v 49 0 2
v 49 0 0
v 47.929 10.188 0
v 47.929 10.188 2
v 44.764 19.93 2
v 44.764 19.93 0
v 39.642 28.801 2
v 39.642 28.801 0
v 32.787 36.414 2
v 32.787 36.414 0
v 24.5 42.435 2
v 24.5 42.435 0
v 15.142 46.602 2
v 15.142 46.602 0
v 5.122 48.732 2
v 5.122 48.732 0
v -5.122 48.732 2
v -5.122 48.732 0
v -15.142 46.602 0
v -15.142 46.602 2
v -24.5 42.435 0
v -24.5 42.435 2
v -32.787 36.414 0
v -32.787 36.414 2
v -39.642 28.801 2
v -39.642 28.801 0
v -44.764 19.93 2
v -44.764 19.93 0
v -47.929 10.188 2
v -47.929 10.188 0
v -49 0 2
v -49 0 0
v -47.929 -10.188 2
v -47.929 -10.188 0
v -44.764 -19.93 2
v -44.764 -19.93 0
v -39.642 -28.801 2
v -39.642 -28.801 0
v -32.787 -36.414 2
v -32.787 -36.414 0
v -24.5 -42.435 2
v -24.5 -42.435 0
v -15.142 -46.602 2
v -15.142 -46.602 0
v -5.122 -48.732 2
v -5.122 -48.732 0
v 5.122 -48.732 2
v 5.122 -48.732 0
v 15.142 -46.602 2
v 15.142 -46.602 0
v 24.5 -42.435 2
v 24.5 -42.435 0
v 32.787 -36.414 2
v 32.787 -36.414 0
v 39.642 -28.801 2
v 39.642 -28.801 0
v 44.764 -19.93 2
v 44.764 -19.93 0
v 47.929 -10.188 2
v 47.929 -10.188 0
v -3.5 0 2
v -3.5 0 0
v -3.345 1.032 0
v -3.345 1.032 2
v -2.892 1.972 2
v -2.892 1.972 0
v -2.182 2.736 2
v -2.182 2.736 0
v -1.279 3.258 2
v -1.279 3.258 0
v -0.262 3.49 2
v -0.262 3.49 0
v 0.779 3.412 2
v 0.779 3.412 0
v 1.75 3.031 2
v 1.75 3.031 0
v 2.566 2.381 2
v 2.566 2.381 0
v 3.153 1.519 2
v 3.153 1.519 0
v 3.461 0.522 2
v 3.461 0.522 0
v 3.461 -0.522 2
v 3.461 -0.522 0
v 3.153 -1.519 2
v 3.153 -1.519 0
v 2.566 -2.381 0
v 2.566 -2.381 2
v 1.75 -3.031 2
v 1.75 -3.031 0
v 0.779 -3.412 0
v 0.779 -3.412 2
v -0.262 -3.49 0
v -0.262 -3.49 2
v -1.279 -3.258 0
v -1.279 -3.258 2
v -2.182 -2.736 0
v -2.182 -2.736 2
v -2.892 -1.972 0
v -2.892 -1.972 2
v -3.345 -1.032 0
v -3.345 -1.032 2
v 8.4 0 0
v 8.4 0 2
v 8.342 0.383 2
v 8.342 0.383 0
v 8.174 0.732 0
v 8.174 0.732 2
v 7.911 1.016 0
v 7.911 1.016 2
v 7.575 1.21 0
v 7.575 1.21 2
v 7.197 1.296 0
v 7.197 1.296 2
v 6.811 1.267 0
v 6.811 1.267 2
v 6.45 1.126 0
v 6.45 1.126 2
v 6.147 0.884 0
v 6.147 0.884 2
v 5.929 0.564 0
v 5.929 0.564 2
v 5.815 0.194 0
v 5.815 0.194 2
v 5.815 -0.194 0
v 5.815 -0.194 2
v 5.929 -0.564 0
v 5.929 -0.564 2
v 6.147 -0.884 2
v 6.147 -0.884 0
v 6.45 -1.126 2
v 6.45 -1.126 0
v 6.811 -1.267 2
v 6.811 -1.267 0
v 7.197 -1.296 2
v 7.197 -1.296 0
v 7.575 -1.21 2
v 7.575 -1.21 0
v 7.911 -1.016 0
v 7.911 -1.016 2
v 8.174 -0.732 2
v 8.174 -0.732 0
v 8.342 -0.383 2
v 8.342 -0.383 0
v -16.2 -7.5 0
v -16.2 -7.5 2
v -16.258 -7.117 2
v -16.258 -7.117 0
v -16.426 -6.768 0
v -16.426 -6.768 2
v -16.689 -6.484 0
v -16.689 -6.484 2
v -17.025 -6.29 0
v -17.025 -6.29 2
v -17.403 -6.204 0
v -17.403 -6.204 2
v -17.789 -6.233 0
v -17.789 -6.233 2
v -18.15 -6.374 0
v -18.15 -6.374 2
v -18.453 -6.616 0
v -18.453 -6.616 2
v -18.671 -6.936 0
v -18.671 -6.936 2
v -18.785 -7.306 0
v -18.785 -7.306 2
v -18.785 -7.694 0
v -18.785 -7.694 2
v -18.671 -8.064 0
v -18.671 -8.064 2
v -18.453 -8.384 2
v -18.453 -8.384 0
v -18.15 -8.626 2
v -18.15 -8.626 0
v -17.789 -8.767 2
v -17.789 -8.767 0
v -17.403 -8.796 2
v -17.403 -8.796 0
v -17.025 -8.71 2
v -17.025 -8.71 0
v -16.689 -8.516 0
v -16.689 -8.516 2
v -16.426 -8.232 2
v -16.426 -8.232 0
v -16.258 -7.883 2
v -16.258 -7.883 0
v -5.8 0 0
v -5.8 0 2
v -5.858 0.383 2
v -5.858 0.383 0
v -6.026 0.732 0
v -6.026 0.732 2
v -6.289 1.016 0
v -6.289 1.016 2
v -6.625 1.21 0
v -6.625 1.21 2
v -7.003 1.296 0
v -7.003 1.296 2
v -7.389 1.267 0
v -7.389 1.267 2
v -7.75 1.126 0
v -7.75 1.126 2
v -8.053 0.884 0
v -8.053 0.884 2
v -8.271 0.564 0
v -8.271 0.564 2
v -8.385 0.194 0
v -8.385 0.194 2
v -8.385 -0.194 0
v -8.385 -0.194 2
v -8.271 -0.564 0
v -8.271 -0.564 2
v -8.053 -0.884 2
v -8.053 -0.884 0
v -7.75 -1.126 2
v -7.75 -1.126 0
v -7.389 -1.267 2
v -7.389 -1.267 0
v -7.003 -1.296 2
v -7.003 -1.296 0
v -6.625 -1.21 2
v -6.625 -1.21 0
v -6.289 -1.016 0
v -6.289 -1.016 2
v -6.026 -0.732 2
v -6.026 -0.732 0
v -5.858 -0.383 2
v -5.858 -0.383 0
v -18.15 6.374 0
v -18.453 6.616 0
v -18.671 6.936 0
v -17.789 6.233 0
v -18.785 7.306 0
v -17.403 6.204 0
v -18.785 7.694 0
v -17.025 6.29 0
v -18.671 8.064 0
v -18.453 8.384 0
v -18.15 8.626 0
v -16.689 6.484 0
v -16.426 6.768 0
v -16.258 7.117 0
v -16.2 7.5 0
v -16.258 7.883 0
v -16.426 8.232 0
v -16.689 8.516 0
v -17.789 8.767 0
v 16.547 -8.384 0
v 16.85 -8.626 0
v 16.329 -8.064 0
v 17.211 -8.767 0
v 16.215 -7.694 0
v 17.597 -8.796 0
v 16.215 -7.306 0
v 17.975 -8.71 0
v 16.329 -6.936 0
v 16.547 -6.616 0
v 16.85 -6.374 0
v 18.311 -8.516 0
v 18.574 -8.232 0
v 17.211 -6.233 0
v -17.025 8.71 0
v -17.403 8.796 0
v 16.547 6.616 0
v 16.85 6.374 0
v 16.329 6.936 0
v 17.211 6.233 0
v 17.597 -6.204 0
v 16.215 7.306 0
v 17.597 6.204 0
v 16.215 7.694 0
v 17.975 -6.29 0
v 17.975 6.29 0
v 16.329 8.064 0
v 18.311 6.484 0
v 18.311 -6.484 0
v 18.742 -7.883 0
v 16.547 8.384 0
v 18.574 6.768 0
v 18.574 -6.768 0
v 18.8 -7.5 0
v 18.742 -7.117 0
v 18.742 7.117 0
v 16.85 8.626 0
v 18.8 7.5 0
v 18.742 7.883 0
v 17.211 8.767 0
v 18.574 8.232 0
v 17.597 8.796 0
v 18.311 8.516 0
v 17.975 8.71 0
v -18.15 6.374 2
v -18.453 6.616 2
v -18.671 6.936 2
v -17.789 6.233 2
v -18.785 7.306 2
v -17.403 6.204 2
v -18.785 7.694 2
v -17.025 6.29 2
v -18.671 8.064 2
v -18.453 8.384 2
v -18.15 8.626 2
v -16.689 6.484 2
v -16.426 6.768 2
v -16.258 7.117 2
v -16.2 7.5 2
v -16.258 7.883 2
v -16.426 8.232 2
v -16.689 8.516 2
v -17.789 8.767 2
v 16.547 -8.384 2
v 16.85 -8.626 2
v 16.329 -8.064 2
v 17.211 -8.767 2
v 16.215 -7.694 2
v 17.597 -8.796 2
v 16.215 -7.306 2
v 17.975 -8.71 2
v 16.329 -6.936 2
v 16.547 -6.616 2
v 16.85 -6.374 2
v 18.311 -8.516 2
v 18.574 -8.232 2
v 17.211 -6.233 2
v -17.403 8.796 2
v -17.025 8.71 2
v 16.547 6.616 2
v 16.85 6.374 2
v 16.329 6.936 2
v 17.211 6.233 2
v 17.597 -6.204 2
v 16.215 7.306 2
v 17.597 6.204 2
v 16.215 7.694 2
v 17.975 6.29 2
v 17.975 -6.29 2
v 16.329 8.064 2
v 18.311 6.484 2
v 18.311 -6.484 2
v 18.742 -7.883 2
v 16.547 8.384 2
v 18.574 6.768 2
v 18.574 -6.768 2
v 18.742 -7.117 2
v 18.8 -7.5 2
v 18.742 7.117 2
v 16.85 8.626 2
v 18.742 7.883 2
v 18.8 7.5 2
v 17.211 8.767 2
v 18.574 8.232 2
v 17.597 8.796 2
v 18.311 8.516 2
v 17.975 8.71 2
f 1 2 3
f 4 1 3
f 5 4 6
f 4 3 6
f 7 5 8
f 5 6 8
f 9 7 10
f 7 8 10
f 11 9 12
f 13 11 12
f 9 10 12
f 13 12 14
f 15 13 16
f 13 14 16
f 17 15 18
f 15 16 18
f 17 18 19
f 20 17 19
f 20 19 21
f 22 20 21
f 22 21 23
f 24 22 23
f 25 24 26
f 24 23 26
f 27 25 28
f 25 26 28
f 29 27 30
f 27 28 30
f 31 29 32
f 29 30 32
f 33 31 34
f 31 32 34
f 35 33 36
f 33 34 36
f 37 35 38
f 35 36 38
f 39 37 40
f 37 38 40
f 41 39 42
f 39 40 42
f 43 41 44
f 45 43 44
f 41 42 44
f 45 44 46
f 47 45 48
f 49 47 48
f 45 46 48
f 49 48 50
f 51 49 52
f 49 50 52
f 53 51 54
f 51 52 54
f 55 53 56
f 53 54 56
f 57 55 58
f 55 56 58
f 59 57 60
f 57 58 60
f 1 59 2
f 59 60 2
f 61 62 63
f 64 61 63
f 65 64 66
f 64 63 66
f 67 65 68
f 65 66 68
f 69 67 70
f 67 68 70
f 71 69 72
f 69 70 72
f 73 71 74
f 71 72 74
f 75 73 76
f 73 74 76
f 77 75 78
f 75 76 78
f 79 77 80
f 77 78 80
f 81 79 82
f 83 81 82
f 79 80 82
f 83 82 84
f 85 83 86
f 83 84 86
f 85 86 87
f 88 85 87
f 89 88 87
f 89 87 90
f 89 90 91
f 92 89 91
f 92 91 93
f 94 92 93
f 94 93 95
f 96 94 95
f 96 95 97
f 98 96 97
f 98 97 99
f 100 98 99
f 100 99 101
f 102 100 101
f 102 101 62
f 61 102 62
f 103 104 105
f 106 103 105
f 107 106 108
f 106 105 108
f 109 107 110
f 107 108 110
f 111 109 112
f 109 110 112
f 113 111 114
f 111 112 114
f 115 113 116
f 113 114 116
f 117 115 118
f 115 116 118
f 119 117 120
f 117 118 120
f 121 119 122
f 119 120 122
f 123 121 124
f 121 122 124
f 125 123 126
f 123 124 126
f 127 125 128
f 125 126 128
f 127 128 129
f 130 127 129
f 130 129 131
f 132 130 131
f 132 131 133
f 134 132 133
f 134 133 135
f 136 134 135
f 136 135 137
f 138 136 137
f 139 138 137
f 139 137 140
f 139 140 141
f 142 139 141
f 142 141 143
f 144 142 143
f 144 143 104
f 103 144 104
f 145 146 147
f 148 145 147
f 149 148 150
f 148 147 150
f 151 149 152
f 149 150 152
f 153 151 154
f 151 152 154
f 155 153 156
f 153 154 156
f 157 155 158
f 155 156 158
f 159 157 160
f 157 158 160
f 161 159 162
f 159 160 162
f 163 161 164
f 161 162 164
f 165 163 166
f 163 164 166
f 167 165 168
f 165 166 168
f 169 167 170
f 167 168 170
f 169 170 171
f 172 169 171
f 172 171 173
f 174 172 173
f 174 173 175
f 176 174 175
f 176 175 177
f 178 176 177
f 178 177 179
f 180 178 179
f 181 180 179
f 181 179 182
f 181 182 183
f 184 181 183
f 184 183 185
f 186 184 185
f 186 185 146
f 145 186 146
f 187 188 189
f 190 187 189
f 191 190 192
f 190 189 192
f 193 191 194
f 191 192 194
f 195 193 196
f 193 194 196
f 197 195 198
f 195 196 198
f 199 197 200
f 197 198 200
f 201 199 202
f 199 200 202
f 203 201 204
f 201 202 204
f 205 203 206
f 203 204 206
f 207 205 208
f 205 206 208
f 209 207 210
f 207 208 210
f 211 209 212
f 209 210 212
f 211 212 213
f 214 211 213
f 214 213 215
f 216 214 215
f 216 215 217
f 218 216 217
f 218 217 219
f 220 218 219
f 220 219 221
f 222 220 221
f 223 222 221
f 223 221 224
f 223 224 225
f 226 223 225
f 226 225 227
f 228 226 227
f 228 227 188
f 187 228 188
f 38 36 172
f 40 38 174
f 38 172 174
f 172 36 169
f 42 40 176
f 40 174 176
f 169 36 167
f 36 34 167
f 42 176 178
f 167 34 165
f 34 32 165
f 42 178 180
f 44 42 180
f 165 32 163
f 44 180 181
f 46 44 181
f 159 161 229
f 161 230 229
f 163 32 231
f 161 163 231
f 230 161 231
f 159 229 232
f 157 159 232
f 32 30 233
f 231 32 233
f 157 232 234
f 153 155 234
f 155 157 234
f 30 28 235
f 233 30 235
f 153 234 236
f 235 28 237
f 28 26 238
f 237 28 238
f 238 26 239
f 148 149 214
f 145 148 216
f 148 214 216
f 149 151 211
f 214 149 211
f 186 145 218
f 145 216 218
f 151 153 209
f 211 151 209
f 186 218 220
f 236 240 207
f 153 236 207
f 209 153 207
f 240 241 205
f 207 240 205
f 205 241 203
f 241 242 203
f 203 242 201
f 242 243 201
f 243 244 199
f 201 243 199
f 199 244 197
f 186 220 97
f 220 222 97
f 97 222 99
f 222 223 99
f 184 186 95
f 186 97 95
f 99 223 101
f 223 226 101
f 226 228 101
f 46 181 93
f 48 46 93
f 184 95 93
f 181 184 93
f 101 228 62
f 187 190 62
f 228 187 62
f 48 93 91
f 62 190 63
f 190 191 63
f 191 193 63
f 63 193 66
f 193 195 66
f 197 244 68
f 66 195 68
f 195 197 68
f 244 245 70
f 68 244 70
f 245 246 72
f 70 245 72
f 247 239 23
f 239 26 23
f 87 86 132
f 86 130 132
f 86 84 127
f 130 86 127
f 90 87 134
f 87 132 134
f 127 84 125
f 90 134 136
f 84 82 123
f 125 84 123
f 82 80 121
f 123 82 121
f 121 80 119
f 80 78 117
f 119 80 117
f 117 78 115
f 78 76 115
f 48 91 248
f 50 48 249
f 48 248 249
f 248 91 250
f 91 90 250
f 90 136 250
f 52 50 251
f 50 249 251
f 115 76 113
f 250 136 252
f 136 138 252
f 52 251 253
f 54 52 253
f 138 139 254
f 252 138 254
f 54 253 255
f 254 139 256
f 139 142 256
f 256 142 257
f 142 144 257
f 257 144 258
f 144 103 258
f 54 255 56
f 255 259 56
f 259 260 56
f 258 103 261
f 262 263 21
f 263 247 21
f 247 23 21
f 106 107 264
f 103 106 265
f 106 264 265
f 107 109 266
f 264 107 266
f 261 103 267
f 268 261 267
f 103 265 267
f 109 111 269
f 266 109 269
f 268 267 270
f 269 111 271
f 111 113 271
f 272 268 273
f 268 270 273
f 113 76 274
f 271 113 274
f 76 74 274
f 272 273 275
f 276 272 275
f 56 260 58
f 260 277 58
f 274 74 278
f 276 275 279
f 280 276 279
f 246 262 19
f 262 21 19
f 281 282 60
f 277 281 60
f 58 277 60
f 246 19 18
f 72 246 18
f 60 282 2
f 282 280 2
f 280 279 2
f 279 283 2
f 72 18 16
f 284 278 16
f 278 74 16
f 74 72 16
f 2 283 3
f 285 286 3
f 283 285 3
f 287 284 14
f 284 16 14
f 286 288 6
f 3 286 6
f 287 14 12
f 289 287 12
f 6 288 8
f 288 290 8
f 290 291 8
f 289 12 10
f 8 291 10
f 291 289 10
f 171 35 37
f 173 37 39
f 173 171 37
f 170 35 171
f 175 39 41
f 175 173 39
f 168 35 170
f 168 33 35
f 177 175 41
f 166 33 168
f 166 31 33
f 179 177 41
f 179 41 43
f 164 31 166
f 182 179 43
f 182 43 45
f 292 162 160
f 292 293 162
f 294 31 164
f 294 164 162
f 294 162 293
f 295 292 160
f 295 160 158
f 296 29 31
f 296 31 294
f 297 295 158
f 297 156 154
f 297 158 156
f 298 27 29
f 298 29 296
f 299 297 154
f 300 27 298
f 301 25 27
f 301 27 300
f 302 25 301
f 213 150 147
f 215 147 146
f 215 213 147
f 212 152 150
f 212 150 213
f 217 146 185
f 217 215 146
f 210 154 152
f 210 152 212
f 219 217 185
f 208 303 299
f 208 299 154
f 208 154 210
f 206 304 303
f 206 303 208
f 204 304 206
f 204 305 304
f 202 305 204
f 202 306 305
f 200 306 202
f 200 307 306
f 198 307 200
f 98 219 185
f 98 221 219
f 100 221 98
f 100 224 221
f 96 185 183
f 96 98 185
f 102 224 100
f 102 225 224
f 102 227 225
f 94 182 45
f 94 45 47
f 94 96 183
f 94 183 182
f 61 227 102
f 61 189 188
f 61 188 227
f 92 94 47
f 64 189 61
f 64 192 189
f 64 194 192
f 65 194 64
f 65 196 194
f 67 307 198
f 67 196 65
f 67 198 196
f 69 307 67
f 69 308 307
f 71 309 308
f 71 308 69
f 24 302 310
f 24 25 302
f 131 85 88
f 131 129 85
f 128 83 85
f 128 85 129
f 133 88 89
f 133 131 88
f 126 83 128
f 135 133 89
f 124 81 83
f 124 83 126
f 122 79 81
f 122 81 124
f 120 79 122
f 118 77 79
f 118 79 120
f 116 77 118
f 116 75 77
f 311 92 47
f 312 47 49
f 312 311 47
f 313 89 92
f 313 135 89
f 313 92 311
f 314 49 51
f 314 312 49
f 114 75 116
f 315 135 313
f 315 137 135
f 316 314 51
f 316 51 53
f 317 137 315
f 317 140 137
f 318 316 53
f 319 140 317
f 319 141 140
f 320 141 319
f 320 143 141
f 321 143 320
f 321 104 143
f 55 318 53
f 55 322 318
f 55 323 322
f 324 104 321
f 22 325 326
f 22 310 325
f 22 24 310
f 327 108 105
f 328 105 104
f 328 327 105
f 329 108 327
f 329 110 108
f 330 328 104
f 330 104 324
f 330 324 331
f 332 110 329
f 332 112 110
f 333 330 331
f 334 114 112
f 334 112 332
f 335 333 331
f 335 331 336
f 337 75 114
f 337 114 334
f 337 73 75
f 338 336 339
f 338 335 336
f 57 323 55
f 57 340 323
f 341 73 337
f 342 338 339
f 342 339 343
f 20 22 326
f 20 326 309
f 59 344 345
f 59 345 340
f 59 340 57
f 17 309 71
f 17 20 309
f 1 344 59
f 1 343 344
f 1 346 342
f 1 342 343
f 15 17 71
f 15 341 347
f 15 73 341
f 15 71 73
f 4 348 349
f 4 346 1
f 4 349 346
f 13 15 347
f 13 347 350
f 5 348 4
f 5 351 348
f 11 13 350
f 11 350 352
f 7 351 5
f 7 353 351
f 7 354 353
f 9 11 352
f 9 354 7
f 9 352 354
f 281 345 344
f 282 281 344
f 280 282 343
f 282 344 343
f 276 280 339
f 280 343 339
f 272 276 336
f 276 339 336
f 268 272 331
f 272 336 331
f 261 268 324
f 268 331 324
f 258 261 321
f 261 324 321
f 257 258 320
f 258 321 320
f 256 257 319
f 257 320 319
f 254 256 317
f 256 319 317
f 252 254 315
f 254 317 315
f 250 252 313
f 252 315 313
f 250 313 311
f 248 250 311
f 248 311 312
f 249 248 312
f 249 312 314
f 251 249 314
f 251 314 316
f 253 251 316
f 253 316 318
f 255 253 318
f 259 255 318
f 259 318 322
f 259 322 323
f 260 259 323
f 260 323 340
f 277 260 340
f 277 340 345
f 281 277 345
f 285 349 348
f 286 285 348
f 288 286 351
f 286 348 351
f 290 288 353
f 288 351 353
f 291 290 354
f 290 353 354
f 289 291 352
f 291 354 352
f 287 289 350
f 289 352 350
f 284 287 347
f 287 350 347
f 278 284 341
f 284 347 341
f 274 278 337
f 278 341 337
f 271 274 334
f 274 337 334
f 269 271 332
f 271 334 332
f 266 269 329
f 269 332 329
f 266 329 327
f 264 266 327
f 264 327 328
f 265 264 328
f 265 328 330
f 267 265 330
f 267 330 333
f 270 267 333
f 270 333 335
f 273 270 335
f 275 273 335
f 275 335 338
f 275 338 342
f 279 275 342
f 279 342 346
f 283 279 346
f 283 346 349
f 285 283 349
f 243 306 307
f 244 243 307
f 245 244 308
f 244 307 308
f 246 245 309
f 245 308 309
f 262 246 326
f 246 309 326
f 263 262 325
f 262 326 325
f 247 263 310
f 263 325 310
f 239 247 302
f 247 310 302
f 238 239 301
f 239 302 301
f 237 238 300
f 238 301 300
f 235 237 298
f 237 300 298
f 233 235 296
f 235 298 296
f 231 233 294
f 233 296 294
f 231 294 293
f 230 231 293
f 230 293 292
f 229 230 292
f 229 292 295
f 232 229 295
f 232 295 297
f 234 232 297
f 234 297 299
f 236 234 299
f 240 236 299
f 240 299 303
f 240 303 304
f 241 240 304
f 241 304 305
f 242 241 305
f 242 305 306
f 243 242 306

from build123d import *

# Parameters (mm, degrees)
SZKIC1_R                    = 49
DODANIE_WYCI_GNI_CIE1_DEPTH = 2
WYTNIJ_WYCI_GNI_CIE2_REACH  = 4
SZKIC4_R                    = 3.5
OTW_R_POD_RUB_M21_D         = 2.6
OTW_R_POD_RUB_M21_DEPTH     = 2
OTW_R_POD_RUB_M22_D         = 2.6
OTW_R_POD_RUB_M22_DEPTH     = 2


with BuildPart() as part:
    # Szkic1 → Dodanie-wyciągnięcie1 (new body)
    with BuildSketch(Plane.XY):
        Circle(SZKIC1_R)
    extrude(amount=DODANIE_WYCI_GNI_CIE1_DEPTH)

    # Szkic4 → Wytnij-wyciągnięcie2 (cut, up to next)
    with BuildSketch(Plane(origin=(0, 0, 0), x_dir=(-1, 0, 0), z_dir=(0, 0, -1)), mode=Mode.PRIVATE) as wytnij_wyci_gni_cie2_sk1:
        Circle(SZKIC4_R)
    wytnij_wyci_gni_cie2_tool1 = extrude(wytnij_wyci_gni_cie2_sk1.sketch, amount=-WYTNIJ_WYCI_GNI_CIE2_REACH, mode=Mode.PRIVATE) & part.part
    add(wytnij_wyci_gni_cie2_tool1.solids().sort_by_distance((0, 0, 0))[0], mode=Mode.SUBTRACT)

    # Otwór pod śrubę M21
    with Locations(Plane(origin=(-17.5, 7.5, 0), x_dir=(-1, 0, 0), z_dir=(0, 0, -1))):
        with Locations((0, 0), (0, -15), (-35, -15), (-35, 0)):
            Hole(OTW_R_POD_RUB_M21_D / 2, depth=OTW_R_POD_RUB_M21_DEPTH)

    # Otwór pod śrubę M22
    with Locations(Plane(origin=(-7.1, 0, 0), x_dir=(-1, 0, 0), z_dir=(0, 0, -1))):
        with Locations((0, 0), (-14.2, 0)):
            Hole(OTW_R_POD_RUB_M22_D / 2, depth=OTW_R_POD_RUB_M22_DEPTH)


solid = part.part
